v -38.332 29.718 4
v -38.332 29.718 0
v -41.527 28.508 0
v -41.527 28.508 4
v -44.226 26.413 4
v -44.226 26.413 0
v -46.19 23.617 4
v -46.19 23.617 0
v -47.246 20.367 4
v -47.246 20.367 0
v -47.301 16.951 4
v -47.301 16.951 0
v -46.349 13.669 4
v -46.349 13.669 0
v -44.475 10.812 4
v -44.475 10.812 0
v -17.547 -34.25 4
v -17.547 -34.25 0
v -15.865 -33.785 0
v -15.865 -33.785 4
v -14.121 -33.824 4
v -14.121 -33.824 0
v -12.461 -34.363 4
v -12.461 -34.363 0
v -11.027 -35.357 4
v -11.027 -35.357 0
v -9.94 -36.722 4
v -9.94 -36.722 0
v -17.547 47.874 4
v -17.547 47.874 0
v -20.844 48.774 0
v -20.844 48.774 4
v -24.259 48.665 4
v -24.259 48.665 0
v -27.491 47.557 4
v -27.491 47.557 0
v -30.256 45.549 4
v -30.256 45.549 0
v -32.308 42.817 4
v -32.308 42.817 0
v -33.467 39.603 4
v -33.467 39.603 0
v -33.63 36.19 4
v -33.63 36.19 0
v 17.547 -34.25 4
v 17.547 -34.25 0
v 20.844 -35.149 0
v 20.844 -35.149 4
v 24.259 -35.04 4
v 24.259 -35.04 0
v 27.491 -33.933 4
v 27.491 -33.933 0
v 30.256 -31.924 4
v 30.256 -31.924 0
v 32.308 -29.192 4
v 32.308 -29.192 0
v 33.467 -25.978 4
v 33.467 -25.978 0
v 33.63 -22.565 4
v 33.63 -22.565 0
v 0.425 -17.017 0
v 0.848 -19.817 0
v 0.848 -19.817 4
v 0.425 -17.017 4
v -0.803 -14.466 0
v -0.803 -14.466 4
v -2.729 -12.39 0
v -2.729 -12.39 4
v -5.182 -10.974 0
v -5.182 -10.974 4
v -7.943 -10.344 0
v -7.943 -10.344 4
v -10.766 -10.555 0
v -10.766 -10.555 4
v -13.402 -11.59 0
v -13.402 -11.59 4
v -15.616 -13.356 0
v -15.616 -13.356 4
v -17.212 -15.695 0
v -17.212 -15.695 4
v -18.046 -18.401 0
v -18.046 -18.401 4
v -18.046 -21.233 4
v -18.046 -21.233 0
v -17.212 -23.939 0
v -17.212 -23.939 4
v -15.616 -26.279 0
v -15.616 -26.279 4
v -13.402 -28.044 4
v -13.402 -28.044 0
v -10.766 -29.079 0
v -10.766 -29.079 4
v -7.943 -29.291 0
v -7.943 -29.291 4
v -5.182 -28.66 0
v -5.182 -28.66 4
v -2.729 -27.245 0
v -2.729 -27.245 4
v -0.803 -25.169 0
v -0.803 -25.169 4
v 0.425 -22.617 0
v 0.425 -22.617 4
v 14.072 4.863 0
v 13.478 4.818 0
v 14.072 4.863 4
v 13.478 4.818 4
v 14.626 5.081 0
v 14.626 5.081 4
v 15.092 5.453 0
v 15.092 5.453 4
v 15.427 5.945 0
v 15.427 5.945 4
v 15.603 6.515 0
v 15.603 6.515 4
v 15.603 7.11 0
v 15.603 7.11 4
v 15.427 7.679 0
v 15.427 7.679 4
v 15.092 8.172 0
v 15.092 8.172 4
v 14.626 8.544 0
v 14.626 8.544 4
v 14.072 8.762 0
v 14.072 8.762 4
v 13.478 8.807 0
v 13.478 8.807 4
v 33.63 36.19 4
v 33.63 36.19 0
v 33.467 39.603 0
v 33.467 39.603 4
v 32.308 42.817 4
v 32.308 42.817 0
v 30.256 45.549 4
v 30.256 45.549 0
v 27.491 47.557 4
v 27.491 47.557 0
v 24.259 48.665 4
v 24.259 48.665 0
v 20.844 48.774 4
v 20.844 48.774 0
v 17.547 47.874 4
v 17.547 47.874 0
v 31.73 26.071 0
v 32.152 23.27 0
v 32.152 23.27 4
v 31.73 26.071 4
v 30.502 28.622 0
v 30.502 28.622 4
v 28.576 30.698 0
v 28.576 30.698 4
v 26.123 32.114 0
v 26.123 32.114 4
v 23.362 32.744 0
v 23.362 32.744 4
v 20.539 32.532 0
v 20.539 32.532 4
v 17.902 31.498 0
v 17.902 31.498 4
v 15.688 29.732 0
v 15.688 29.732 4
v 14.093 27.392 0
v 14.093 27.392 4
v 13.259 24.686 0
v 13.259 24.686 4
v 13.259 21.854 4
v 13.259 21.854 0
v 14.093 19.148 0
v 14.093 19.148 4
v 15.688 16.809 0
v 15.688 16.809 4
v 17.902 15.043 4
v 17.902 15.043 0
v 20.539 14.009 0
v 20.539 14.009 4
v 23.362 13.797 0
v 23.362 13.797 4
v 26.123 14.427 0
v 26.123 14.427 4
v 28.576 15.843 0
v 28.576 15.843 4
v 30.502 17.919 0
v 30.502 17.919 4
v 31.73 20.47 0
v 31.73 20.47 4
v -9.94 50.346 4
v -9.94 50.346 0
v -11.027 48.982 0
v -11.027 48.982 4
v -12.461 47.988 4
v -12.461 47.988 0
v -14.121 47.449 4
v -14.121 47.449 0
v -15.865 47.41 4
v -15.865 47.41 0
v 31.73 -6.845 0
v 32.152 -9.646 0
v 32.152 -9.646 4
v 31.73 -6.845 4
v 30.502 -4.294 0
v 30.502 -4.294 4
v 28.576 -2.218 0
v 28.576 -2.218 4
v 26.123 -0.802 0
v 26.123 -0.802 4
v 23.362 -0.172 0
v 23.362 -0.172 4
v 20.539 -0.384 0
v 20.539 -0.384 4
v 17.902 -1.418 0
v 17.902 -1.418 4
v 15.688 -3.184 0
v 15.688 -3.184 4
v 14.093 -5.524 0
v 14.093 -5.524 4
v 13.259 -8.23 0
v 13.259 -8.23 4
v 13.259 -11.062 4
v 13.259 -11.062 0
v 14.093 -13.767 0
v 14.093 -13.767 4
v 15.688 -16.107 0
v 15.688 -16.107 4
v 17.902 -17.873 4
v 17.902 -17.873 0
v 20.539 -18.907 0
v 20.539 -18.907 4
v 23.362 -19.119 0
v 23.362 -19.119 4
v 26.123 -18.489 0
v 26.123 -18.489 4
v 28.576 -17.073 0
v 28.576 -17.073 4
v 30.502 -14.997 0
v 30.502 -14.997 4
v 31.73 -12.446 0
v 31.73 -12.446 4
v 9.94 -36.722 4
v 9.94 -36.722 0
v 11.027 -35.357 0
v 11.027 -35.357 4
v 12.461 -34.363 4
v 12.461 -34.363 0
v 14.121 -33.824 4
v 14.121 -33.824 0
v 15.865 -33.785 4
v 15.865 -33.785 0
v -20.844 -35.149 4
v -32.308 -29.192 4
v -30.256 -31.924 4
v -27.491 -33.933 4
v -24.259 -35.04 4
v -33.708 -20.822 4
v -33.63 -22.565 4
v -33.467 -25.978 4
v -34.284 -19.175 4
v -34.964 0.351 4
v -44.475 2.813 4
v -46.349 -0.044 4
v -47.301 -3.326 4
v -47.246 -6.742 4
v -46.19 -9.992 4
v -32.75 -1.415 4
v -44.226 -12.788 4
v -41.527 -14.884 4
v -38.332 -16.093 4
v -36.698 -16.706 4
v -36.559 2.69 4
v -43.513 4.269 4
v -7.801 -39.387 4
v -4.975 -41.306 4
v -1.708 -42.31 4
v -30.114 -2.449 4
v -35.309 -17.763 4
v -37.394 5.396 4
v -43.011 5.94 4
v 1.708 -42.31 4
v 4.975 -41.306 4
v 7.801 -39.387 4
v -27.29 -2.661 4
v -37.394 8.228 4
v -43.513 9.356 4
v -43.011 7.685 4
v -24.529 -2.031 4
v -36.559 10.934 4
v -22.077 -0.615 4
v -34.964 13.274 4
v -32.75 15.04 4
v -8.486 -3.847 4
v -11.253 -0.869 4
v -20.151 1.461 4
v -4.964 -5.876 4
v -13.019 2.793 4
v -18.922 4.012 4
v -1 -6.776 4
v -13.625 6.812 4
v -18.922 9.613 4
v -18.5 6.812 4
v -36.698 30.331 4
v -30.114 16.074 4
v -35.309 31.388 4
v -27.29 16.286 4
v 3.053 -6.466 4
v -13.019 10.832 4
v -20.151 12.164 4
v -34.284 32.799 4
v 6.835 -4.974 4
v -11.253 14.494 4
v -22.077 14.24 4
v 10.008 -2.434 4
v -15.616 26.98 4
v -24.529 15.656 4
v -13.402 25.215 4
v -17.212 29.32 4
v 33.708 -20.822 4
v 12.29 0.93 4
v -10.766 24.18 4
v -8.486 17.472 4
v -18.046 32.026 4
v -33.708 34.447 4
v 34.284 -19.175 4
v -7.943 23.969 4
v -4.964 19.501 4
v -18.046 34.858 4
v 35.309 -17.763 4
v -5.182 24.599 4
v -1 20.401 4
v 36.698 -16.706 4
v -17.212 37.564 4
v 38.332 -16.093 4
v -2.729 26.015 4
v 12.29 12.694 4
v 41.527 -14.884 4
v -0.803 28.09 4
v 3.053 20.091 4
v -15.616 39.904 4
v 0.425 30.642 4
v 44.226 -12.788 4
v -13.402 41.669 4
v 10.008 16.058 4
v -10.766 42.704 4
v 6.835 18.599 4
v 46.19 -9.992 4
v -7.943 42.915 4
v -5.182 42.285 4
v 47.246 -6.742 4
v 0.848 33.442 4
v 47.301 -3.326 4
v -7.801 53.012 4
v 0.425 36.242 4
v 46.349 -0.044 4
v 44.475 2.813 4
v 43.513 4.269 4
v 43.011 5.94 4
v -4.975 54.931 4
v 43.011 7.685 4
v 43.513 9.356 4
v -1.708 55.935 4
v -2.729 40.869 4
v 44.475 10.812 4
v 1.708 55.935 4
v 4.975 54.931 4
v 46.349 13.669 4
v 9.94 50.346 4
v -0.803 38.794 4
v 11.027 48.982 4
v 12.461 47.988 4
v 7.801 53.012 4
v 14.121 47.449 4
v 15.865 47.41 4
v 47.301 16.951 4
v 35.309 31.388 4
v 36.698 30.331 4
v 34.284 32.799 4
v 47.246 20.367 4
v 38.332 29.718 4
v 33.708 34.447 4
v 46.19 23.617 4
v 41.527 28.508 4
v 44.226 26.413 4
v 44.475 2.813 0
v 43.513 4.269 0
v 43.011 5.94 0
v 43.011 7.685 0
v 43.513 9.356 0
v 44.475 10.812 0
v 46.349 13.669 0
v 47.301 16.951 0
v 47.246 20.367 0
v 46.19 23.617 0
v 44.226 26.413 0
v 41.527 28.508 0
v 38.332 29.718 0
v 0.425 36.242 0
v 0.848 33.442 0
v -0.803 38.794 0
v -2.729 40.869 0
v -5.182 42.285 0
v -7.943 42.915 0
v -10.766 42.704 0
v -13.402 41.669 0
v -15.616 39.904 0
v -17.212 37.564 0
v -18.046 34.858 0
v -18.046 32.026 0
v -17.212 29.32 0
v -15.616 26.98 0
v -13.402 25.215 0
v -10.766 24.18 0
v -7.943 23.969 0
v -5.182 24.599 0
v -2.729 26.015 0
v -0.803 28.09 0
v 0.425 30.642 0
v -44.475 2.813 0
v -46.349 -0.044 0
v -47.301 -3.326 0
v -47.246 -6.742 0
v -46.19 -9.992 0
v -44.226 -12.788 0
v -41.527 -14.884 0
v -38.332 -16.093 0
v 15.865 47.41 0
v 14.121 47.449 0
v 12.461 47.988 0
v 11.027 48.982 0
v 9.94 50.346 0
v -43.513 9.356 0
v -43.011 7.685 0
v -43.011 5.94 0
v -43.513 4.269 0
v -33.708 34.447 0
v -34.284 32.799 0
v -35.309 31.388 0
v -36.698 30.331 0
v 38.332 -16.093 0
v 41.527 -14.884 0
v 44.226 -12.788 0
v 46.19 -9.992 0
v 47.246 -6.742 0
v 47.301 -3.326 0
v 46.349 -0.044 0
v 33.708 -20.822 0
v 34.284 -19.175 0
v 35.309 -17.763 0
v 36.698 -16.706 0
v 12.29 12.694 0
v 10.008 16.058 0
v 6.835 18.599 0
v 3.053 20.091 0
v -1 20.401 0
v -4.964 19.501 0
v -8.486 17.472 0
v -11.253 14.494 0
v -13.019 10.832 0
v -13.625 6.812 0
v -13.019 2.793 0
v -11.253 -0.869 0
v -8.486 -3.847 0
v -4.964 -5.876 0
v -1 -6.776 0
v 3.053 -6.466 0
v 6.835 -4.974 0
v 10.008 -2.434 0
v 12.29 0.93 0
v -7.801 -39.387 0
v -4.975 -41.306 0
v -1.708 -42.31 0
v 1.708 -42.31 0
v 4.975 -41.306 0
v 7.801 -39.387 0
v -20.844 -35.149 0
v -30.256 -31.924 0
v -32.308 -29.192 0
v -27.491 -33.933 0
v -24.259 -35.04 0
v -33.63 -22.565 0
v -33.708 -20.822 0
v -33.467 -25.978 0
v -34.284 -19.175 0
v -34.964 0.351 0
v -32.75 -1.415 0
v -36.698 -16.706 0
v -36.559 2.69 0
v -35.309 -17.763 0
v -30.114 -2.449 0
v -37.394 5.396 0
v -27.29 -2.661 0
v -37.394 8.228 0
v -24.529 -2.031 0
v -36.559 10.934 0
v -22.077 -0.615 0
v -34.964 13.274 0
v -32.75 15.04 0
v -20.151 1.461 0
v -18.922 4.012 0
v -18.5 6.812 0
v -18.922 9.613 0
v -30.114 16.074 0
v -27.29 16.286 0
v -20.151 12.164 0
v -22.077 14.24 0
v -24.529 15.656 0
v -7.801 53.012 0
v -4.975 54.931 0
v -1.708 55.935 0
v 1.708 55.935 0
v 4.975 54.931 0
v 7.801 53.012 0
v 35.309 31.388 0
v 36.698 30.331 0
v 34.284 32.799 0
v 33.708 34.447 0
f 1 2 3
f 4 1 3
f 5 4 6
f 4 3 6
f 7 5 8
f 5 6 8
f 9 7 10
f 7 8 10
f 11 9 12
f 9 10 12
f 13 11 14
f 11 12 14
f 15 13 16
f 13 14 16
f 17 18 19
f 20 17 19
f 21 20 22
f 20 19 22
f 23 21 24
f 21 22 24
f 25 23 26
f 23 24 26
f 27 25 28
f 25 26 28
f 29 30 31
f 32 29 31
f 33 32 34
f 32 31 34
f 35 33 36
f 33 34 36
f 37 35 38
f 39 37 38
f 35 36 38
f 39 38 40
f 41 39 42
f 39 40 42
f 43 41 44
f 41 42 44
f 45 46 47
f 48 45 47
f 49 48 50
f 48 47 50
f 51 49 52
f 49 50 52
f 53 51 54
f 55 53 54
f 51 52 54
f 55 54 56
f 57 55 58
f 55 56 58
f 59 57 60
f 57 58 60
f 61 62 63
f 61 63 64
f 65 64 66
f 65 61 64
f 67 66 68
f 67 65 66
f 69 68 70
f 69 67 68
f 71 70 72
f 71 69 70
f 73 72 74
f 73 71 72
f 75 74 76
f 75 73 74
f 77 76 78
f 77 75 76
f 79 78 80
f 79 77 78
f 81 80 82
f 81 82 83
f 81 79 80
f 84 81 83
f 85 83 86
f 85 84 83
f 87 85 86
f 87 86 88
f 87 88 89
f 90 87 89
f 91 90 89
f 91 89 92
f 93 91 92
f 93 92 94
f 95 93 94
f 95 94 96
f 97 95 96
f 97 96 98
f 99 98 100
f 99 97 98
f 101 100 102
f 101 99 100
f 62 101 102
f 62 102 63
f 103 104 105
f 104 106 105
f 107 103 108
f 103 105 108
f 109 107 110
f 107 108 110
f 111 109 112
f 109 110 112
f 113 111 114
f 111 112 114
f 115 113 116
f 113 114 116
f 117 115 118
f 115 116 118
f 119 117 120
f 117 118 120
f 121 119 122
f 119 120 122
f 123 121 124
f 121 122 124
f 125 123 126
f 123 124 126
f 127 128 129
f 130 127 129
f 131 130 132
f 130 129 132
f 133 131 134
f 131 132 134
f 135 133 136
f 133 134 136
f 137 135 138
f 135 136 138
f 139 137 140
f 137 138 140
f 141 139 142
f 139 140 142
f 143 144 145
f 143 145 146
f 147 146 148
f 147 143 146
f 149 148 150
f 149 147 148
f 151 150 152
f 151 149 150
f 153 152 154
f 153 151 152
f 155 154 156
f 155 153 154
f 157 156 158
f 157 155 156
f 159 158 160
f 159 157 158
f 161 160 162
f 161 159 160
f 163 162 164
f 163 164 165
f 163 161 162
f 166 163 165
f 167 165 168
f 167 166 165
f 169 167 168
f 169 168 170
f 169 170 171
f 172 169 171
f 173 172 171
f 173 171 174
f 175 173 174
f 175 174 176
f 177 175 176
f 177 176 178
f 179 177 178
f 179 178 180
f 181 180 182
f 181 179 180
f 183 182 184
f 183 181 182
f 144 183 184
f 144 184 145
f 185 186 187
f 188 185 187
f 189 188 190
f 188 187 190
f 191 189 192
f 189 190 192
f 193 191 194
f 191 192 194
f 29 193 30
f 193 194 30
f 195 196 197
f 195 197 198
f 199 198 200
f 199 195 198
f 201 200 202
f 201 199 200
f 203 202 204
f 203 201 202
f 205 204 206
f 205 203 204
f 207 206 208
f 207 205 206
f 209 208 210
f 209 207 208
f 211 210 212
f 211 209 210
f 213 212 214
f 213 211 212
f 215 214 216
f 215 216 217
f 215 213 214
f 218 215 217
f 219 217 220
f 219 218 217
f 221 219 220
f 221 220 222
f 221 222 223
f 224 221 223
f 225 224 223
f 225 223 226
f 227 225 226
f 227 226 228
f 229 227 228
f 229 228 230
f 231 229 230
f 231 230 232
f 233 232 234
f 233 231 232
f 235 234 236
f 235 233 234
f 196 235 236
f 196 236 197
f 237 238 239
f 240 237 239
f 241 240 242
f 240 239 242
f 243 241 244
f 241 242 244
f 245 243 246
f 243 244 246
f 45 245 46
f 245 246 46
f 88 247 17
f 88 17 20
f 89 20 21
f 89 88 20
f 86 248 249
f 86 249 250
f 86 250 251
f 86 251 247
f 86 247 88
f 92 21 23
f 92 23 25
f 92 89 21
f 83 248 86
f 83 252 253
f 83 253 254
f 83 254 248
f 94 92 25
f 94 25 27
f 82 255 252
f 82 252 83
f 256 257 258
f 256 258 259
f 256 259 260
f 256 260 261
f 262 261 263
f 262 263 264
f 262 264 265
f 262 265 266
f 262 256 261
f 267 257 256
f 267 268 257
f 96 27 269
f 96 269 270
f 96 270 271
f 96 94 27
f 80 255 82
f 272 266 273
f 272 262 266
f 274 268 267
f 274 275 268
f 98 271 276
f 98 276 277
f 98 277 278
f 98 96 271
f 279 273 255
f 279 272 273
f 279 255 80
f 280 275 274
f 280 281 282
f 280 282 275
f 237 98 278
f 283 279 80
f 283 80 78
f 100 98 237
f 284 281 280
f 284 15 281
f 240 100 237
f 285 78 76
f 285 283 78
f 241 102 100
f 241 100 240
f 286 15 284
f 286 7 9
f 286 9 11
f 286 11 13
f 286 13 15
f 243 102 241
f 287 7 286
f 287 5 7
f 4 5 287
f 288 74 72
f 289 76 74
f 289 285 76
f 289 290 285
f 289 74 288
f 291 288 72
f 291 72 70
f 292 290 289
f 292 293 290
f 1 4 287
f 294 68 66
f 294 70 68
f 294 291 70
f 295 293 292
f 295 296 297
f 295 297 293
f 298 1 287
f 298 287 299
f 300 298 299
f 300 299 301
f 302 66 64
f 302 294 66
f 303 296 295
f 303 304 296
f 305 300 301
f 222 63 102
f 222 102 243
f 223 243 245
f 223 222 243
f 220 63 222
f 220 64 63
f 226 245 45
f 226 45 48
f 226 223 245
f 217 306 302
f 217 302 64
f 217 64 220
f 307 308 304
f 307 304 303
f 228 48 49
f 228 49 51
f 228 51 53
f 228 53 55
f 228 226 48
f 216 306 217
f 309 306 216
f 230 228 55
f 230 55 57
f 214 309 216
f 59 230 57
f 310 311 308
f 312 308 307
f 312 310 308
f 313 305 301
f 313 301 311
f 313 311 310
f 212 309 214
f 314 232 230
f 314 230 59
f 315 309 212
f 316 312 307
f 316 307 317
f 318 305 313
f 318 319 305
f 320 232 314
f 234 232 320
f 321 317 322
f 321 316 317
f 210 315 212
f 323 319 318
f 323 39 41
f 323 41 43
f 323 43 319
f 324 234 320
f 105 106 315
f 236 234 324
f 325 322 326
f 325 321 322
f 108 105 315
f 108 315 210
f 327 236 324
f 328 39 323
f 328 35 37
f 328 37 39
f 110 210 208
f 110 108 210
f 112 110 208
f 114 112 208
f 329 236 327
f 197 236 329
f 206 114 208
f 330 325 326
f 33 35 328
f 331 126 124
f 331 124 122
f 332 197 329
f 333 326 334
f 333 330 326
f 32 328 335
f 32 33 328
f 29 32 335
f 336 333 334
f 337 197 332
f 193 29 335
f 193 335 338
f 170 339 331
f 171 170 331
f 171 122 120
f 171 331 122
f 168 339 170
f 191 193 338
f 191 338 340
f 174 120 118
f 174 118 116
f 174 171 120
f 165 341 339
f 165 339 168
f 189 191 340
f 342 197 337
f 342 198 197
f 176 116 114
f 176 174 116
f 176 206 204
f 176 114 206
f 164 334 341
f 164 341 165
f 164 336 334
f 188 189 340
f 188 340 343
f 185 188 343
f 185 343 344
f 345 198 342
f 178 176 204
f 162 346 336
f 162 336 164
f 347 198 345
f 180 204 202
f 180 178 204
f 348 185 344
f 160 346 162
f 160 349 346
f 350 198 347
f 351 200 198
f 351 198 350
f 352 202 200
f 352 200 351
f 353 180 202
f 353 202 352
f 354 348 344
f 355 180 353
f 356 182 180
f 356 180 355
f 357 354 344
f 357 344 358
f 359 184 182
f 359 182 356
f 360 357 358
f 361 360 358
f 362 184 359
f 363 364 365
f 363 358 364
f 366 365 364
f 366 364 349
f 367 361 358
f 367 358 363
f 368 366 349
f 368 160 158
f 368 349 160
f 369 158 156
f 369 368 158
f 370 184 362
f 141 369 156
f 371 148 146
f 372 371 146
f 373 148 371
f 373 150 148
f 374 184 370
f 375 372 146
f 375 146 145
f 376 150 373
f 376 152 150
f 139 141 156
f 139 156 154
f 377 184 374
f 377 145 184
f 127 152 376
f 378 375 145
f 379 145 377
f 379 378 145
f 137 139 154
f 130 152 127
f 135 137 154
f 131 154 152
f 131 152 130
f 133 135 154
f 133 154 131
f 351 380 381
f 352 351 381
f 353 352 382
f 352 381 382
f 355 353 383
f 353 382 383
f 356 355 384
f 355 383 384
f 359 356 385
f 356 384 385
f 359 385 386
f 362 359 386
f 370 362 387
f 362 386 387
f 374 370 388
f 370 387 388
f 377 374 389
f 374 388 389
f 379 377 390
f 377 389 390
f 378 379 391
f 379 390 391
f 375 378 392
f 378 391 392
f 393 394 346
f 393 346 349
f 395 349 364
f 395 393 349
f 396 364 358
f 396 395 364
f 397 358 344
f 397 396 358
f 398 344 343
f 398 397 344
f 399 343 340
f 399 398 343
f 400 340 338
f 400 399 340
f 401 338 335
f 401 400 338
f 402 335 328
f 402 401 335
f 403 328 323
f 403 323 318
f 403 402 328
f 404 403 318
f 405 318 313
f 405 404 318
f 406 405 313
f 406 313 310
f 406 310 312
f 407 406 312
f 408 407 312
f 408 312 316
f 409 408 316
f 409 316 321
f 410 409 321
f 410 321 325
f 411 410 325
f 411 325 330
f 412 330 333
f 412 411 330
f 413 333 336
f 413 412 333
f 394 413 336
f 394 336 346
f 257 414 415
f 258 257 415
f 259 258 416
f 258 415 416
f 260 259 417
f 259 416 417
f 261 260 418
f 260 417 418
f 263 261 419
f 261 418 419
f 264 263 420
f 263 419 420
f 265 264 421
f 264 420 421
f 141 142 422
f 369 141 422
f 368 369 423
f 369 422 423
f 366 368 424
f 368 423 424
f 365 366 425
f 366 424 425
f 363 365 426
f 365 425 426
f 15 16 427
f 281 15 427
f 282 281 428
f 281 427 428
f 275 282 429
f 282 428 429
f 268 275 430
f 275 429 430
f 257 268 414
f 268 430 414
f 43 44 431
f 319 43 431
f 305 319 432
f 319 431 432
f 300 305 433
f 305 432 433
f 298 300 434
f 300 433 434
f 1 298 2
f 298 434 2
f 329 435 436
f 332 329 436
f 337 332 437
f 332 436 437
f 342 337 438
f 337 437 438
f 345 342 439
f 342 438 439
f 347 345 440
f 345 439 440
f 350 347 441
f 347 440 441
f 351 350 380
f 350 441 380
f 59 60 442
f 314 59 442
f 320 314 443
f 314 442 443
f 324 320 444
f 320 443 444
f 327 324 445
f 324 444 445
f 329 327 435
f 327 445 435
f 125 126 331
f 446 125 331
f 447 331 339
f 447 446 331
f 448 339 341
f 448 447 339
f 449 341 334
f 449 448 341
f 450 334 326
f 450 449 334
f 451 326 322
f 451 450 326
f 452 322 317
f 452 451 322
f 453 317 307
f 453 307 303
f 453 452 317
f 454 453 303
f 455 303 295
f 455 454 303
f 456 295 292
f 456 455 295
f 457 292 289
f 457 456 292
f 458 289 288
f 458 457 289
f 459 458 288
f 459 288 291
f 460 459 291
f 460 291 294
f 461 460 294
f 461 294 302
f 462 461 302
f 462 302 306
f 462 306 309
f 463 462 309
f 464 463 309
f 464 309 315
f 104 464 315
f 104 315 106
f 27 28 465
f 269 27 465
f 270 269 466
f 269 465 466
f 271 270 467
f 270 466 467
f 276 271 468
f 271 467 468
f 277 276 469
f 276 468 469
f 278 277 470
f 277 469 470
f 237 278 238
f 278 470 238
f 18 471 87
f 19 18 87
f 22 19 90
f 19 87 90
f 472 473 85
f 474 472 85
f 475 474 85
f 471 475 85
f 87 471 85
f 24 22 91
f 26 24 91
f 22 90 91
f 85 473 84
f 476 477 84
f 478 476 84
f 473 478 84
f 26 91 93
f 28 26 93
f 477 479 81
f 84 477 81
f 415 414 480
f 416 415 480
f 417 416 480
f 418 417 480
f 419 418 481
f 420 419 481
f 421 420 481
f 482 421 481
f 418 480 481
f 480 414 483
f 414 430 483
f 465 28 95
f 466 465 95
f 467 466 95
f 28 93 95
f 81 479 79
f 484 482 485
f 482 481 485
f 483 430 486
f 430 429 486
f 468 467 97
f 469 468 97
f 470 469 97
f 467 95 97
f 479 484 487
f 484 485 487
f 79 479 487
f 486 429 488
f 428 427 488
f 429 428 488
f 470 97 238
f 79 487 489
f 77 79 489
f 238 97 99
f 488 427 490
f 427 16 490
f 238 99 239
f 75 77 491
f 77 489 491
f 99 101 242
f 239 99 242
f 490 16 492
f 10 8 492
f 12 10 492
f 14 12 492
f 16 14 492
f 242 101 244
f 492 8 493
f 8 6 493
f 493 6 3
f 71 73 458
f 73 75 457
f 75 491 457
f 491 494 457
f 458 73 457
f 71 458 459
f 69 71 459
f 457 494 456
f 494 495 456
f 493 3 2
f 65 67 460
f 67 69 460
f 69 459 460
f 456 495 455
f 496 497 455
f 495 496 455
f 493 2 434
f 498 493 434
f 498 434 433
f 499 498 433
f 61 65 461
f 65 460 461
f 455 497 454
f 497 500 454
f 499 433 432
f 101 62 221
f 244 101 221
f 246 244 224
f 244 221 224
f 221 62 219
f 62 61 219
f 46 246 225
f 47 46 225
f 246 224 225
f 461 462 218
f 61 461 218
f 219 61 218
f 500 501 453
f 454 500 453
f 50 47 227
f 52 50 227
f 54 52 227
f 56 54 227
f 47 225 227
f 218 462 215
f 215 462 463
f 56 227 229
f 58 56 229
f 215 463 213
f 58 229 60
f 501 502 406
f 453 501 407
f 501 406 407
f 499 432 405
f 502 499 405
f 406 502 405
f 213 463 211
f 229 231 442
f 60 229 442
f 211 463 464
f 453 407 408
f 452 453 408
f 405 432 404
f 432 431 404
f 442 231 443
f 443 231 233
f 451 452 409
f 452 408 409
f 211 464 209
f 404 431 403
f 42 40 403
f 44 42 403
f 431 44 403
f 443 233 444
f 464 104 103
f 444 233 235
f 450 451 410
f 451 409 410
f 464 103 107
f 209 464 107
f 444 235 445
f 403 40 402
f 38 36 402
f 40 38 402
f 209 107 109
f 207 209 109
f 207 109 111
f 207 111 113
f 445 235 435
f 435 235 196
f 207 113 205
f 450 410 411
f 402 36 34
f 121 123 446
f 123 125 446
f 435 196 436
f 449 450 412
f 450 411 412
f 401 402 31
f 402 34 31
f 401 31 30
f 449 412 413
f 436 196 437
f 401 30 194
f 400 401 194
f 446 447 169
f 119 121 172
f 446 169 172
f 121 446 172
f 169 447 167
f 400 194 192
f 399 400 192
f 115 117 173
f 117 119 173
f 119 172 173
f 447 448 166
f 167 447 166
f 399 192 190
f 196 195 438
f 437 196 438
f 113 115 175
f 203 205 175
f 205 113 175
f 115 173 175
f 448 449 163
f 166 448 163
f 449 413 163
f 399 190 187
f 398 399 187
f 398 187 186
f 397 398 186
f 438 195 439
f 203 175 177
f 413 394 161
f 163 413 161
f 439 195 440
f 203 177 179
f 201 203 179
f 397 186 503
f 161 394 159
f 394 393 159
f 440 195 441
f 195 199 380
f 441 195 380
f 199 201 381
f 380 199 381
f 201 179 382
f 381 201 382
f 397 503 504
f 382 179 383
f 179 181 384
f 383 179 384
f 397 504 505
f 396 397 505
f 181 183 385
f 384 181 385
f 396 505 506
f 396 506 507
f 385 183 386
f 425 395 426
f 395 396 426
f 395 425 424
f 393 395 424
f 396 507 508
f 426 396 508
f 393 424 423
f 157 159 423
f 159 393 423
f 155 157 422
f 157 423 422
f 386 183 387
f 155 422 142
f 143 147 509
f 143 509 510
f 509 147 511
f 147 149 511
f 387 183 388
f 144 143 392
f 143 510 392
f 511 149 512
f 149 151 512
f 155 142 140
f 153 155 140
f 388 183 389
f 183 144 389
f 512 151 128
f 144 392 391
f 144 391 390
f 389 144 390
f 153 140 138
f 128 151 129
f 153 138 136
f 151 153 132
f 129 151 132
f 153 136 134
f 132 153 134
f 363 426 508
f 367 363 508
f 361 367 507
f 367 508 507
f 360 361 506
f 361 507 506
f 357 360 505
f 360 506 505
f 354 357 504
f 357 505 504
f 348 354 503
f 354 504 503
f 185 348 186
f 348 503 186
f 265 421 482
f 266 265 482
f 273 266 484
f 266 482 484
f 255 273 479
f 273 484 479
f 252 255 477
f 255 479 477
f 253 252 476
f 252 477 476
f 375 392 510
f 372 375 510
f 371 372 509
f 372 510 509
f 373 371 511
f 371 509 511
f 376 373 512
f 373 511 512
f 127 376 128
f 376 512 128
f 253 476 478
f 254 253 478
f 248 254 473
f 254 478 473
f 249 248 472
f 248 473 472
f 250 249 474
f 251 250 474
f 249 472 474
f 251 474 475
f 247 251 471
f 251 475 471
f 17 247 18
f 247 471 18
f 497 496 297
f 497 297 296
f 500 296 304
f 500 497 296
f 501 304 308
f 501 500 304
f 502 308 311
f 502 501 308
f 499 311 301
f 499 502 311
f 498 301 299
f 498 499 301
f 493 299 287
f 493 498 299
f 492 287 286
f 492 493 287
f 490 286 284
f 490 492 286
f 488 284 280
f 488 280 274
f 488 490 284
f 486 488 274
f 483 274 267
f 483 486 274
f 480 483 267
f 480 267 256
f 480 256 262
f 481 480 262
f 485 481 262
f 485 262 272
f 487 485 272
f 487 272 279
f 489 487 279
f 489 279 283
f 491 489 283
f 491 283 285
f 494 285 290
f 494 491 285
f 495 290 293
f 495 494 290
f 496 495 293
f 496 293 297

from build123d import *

# Parameters (mm, degrees)
SKETCH_1_R          = 13.625
SKETCH_1_R_2        = 9.5
EXTRUDE_1_DEPTH     = 4
SKETCH_2_R          = 2
CUT_EXTRUDE_1_DEPTH = 4


with BuildPart() as part:
    # 草图1 → 凸台-拉伸1 (new body)
    with BuildSketch(Plane.XY):
        with BuildLine():
            ThreePointArc((-9.939636128, -36.721524578), (0, -42.437612957), (9.939636128, -36.721524578))
            ThreePointArc((9.939636128, -36.721524578), (13.271431273, -34.0328785), (17.547256679, -34.24965882))
            ThreePointArc((17.547256679, -34.24965882), (28.948423675, -33.03169993), (33.629925771, -22.564915761))
            ThreePointArc((33.629925771, -22.564915761), (34.745058151, -18.431375342), (38.331693845, -16.093487189))
            ThreePointArc((38.331693845, -16.093487189), (46.839533428, -8.40669993), (44.474726808, 2.81282423))
            ThreePointArc((44.474726808, 2.81282423), (42.947253757, 6.812387043), (44.474726808, 10.811949856))
            ThreePointArc((44.474726808, 10.811949856), (46.839533428, 22.031474016), (38.331693845, 29.718261275))
            ThreePointArc((38.331693845, 29.718261275), (34.745058151, 32.056149427), (33.629925771, 36.189689846))
            ThreePointArc((33.629925771, 36.189689846), (28.948423675, 46.656474016), (17.547256679, 47.874432905))
            ThreePointArc((17.547256679, 47.874432905), (13.271431273, 47.657652585), (9.939636128, 50.346298663))
            ThreePointArc((9.939636128, 50.346298663), (0, 56.062387043), (-9.939636128, 50.346298663))
            ThreePointArc((-9.939636128, 50.346298663), (-13.271431273, 47.657652585), (-17.547256679, 47.874432905))
            ThreePointArc((-17.547256679, 47.874432905), (-28.948423675, 46.656474016), (-33.629925771, 36.189689846))
            ThreePointArc((-33.629925771, 36.189689846), (-34.745058151, 32.056149427), (-38.331693845, 29.718261275))
            ThreePointArc((-38.331693845, 29.718261275), (-46.839533428, 22.031474016), (-44.474726808, 10.811949856))
            ThreePointArc((-44.474726808, 10.811949856), (-42.947253757, 6.812387043), (-44.474726808, 2.81282423))
            ThreePointArc((-44.474726808, 2.81282423), (-46.839533428, -8.40669993), (-38.331693845, -16.093487189))
            ThreePointArc((-38.331693845, -16.093487189), (-34.745058151, -18.431375342), (-33.629925771, -22.564915761))
            ThreePointArc((-33.629925771, -22.564915761), (-28.948423675, -33.03169993), (-17.547256679, -34.24965882))
            ThreePointArc((-17.547256679, -34.24965882), (-13.271431273, -34.0328785), (-9.939636128, -36.721524578))
        make_face()
        with Locations((0, 6.812387043)):
            Circle(SKETCH_1_R, mode=Mode.SUBTRACT)
        with Locations((-8.652475842, -19.817195414)):
            Circle(SKETCH_1_R_2, mode=Mode.SUBTRACT)
        with Locations((-28, 6.812387043)):
            Circle(SKETCH_1_R_2, mode=Mode.SUBTRACT)
        with Locations((-8.652475842, 33.441969499)):
            Circle(SKETCH_1_R_2, mode=Mode.SUBTRACT)
        with Locations((22.652475842, 23.270374107)):
            Circle(SKETCH_1_R_2, mode=Mode.SUBTRACT)
        with Locations((22.652475842, -9.645600022)):
            Circle(SKETCH_1_R_2, mode=Mode.SUBTRACT)
    extrude(amount=EXTRUDE_1_DEPTH)

    # 草图2 → 切除-拉伸1 (cut)
    with BuildSketch(Plane.XY.offset(4)):
        with Locations((13.625, 6.812387043)):
            Circle(SKETCH_2_R)
    extrude(amount=-CUT_EXTRUDE_1_DEPTH, mode=Mode.SUBTRACT)


solid = part.part
